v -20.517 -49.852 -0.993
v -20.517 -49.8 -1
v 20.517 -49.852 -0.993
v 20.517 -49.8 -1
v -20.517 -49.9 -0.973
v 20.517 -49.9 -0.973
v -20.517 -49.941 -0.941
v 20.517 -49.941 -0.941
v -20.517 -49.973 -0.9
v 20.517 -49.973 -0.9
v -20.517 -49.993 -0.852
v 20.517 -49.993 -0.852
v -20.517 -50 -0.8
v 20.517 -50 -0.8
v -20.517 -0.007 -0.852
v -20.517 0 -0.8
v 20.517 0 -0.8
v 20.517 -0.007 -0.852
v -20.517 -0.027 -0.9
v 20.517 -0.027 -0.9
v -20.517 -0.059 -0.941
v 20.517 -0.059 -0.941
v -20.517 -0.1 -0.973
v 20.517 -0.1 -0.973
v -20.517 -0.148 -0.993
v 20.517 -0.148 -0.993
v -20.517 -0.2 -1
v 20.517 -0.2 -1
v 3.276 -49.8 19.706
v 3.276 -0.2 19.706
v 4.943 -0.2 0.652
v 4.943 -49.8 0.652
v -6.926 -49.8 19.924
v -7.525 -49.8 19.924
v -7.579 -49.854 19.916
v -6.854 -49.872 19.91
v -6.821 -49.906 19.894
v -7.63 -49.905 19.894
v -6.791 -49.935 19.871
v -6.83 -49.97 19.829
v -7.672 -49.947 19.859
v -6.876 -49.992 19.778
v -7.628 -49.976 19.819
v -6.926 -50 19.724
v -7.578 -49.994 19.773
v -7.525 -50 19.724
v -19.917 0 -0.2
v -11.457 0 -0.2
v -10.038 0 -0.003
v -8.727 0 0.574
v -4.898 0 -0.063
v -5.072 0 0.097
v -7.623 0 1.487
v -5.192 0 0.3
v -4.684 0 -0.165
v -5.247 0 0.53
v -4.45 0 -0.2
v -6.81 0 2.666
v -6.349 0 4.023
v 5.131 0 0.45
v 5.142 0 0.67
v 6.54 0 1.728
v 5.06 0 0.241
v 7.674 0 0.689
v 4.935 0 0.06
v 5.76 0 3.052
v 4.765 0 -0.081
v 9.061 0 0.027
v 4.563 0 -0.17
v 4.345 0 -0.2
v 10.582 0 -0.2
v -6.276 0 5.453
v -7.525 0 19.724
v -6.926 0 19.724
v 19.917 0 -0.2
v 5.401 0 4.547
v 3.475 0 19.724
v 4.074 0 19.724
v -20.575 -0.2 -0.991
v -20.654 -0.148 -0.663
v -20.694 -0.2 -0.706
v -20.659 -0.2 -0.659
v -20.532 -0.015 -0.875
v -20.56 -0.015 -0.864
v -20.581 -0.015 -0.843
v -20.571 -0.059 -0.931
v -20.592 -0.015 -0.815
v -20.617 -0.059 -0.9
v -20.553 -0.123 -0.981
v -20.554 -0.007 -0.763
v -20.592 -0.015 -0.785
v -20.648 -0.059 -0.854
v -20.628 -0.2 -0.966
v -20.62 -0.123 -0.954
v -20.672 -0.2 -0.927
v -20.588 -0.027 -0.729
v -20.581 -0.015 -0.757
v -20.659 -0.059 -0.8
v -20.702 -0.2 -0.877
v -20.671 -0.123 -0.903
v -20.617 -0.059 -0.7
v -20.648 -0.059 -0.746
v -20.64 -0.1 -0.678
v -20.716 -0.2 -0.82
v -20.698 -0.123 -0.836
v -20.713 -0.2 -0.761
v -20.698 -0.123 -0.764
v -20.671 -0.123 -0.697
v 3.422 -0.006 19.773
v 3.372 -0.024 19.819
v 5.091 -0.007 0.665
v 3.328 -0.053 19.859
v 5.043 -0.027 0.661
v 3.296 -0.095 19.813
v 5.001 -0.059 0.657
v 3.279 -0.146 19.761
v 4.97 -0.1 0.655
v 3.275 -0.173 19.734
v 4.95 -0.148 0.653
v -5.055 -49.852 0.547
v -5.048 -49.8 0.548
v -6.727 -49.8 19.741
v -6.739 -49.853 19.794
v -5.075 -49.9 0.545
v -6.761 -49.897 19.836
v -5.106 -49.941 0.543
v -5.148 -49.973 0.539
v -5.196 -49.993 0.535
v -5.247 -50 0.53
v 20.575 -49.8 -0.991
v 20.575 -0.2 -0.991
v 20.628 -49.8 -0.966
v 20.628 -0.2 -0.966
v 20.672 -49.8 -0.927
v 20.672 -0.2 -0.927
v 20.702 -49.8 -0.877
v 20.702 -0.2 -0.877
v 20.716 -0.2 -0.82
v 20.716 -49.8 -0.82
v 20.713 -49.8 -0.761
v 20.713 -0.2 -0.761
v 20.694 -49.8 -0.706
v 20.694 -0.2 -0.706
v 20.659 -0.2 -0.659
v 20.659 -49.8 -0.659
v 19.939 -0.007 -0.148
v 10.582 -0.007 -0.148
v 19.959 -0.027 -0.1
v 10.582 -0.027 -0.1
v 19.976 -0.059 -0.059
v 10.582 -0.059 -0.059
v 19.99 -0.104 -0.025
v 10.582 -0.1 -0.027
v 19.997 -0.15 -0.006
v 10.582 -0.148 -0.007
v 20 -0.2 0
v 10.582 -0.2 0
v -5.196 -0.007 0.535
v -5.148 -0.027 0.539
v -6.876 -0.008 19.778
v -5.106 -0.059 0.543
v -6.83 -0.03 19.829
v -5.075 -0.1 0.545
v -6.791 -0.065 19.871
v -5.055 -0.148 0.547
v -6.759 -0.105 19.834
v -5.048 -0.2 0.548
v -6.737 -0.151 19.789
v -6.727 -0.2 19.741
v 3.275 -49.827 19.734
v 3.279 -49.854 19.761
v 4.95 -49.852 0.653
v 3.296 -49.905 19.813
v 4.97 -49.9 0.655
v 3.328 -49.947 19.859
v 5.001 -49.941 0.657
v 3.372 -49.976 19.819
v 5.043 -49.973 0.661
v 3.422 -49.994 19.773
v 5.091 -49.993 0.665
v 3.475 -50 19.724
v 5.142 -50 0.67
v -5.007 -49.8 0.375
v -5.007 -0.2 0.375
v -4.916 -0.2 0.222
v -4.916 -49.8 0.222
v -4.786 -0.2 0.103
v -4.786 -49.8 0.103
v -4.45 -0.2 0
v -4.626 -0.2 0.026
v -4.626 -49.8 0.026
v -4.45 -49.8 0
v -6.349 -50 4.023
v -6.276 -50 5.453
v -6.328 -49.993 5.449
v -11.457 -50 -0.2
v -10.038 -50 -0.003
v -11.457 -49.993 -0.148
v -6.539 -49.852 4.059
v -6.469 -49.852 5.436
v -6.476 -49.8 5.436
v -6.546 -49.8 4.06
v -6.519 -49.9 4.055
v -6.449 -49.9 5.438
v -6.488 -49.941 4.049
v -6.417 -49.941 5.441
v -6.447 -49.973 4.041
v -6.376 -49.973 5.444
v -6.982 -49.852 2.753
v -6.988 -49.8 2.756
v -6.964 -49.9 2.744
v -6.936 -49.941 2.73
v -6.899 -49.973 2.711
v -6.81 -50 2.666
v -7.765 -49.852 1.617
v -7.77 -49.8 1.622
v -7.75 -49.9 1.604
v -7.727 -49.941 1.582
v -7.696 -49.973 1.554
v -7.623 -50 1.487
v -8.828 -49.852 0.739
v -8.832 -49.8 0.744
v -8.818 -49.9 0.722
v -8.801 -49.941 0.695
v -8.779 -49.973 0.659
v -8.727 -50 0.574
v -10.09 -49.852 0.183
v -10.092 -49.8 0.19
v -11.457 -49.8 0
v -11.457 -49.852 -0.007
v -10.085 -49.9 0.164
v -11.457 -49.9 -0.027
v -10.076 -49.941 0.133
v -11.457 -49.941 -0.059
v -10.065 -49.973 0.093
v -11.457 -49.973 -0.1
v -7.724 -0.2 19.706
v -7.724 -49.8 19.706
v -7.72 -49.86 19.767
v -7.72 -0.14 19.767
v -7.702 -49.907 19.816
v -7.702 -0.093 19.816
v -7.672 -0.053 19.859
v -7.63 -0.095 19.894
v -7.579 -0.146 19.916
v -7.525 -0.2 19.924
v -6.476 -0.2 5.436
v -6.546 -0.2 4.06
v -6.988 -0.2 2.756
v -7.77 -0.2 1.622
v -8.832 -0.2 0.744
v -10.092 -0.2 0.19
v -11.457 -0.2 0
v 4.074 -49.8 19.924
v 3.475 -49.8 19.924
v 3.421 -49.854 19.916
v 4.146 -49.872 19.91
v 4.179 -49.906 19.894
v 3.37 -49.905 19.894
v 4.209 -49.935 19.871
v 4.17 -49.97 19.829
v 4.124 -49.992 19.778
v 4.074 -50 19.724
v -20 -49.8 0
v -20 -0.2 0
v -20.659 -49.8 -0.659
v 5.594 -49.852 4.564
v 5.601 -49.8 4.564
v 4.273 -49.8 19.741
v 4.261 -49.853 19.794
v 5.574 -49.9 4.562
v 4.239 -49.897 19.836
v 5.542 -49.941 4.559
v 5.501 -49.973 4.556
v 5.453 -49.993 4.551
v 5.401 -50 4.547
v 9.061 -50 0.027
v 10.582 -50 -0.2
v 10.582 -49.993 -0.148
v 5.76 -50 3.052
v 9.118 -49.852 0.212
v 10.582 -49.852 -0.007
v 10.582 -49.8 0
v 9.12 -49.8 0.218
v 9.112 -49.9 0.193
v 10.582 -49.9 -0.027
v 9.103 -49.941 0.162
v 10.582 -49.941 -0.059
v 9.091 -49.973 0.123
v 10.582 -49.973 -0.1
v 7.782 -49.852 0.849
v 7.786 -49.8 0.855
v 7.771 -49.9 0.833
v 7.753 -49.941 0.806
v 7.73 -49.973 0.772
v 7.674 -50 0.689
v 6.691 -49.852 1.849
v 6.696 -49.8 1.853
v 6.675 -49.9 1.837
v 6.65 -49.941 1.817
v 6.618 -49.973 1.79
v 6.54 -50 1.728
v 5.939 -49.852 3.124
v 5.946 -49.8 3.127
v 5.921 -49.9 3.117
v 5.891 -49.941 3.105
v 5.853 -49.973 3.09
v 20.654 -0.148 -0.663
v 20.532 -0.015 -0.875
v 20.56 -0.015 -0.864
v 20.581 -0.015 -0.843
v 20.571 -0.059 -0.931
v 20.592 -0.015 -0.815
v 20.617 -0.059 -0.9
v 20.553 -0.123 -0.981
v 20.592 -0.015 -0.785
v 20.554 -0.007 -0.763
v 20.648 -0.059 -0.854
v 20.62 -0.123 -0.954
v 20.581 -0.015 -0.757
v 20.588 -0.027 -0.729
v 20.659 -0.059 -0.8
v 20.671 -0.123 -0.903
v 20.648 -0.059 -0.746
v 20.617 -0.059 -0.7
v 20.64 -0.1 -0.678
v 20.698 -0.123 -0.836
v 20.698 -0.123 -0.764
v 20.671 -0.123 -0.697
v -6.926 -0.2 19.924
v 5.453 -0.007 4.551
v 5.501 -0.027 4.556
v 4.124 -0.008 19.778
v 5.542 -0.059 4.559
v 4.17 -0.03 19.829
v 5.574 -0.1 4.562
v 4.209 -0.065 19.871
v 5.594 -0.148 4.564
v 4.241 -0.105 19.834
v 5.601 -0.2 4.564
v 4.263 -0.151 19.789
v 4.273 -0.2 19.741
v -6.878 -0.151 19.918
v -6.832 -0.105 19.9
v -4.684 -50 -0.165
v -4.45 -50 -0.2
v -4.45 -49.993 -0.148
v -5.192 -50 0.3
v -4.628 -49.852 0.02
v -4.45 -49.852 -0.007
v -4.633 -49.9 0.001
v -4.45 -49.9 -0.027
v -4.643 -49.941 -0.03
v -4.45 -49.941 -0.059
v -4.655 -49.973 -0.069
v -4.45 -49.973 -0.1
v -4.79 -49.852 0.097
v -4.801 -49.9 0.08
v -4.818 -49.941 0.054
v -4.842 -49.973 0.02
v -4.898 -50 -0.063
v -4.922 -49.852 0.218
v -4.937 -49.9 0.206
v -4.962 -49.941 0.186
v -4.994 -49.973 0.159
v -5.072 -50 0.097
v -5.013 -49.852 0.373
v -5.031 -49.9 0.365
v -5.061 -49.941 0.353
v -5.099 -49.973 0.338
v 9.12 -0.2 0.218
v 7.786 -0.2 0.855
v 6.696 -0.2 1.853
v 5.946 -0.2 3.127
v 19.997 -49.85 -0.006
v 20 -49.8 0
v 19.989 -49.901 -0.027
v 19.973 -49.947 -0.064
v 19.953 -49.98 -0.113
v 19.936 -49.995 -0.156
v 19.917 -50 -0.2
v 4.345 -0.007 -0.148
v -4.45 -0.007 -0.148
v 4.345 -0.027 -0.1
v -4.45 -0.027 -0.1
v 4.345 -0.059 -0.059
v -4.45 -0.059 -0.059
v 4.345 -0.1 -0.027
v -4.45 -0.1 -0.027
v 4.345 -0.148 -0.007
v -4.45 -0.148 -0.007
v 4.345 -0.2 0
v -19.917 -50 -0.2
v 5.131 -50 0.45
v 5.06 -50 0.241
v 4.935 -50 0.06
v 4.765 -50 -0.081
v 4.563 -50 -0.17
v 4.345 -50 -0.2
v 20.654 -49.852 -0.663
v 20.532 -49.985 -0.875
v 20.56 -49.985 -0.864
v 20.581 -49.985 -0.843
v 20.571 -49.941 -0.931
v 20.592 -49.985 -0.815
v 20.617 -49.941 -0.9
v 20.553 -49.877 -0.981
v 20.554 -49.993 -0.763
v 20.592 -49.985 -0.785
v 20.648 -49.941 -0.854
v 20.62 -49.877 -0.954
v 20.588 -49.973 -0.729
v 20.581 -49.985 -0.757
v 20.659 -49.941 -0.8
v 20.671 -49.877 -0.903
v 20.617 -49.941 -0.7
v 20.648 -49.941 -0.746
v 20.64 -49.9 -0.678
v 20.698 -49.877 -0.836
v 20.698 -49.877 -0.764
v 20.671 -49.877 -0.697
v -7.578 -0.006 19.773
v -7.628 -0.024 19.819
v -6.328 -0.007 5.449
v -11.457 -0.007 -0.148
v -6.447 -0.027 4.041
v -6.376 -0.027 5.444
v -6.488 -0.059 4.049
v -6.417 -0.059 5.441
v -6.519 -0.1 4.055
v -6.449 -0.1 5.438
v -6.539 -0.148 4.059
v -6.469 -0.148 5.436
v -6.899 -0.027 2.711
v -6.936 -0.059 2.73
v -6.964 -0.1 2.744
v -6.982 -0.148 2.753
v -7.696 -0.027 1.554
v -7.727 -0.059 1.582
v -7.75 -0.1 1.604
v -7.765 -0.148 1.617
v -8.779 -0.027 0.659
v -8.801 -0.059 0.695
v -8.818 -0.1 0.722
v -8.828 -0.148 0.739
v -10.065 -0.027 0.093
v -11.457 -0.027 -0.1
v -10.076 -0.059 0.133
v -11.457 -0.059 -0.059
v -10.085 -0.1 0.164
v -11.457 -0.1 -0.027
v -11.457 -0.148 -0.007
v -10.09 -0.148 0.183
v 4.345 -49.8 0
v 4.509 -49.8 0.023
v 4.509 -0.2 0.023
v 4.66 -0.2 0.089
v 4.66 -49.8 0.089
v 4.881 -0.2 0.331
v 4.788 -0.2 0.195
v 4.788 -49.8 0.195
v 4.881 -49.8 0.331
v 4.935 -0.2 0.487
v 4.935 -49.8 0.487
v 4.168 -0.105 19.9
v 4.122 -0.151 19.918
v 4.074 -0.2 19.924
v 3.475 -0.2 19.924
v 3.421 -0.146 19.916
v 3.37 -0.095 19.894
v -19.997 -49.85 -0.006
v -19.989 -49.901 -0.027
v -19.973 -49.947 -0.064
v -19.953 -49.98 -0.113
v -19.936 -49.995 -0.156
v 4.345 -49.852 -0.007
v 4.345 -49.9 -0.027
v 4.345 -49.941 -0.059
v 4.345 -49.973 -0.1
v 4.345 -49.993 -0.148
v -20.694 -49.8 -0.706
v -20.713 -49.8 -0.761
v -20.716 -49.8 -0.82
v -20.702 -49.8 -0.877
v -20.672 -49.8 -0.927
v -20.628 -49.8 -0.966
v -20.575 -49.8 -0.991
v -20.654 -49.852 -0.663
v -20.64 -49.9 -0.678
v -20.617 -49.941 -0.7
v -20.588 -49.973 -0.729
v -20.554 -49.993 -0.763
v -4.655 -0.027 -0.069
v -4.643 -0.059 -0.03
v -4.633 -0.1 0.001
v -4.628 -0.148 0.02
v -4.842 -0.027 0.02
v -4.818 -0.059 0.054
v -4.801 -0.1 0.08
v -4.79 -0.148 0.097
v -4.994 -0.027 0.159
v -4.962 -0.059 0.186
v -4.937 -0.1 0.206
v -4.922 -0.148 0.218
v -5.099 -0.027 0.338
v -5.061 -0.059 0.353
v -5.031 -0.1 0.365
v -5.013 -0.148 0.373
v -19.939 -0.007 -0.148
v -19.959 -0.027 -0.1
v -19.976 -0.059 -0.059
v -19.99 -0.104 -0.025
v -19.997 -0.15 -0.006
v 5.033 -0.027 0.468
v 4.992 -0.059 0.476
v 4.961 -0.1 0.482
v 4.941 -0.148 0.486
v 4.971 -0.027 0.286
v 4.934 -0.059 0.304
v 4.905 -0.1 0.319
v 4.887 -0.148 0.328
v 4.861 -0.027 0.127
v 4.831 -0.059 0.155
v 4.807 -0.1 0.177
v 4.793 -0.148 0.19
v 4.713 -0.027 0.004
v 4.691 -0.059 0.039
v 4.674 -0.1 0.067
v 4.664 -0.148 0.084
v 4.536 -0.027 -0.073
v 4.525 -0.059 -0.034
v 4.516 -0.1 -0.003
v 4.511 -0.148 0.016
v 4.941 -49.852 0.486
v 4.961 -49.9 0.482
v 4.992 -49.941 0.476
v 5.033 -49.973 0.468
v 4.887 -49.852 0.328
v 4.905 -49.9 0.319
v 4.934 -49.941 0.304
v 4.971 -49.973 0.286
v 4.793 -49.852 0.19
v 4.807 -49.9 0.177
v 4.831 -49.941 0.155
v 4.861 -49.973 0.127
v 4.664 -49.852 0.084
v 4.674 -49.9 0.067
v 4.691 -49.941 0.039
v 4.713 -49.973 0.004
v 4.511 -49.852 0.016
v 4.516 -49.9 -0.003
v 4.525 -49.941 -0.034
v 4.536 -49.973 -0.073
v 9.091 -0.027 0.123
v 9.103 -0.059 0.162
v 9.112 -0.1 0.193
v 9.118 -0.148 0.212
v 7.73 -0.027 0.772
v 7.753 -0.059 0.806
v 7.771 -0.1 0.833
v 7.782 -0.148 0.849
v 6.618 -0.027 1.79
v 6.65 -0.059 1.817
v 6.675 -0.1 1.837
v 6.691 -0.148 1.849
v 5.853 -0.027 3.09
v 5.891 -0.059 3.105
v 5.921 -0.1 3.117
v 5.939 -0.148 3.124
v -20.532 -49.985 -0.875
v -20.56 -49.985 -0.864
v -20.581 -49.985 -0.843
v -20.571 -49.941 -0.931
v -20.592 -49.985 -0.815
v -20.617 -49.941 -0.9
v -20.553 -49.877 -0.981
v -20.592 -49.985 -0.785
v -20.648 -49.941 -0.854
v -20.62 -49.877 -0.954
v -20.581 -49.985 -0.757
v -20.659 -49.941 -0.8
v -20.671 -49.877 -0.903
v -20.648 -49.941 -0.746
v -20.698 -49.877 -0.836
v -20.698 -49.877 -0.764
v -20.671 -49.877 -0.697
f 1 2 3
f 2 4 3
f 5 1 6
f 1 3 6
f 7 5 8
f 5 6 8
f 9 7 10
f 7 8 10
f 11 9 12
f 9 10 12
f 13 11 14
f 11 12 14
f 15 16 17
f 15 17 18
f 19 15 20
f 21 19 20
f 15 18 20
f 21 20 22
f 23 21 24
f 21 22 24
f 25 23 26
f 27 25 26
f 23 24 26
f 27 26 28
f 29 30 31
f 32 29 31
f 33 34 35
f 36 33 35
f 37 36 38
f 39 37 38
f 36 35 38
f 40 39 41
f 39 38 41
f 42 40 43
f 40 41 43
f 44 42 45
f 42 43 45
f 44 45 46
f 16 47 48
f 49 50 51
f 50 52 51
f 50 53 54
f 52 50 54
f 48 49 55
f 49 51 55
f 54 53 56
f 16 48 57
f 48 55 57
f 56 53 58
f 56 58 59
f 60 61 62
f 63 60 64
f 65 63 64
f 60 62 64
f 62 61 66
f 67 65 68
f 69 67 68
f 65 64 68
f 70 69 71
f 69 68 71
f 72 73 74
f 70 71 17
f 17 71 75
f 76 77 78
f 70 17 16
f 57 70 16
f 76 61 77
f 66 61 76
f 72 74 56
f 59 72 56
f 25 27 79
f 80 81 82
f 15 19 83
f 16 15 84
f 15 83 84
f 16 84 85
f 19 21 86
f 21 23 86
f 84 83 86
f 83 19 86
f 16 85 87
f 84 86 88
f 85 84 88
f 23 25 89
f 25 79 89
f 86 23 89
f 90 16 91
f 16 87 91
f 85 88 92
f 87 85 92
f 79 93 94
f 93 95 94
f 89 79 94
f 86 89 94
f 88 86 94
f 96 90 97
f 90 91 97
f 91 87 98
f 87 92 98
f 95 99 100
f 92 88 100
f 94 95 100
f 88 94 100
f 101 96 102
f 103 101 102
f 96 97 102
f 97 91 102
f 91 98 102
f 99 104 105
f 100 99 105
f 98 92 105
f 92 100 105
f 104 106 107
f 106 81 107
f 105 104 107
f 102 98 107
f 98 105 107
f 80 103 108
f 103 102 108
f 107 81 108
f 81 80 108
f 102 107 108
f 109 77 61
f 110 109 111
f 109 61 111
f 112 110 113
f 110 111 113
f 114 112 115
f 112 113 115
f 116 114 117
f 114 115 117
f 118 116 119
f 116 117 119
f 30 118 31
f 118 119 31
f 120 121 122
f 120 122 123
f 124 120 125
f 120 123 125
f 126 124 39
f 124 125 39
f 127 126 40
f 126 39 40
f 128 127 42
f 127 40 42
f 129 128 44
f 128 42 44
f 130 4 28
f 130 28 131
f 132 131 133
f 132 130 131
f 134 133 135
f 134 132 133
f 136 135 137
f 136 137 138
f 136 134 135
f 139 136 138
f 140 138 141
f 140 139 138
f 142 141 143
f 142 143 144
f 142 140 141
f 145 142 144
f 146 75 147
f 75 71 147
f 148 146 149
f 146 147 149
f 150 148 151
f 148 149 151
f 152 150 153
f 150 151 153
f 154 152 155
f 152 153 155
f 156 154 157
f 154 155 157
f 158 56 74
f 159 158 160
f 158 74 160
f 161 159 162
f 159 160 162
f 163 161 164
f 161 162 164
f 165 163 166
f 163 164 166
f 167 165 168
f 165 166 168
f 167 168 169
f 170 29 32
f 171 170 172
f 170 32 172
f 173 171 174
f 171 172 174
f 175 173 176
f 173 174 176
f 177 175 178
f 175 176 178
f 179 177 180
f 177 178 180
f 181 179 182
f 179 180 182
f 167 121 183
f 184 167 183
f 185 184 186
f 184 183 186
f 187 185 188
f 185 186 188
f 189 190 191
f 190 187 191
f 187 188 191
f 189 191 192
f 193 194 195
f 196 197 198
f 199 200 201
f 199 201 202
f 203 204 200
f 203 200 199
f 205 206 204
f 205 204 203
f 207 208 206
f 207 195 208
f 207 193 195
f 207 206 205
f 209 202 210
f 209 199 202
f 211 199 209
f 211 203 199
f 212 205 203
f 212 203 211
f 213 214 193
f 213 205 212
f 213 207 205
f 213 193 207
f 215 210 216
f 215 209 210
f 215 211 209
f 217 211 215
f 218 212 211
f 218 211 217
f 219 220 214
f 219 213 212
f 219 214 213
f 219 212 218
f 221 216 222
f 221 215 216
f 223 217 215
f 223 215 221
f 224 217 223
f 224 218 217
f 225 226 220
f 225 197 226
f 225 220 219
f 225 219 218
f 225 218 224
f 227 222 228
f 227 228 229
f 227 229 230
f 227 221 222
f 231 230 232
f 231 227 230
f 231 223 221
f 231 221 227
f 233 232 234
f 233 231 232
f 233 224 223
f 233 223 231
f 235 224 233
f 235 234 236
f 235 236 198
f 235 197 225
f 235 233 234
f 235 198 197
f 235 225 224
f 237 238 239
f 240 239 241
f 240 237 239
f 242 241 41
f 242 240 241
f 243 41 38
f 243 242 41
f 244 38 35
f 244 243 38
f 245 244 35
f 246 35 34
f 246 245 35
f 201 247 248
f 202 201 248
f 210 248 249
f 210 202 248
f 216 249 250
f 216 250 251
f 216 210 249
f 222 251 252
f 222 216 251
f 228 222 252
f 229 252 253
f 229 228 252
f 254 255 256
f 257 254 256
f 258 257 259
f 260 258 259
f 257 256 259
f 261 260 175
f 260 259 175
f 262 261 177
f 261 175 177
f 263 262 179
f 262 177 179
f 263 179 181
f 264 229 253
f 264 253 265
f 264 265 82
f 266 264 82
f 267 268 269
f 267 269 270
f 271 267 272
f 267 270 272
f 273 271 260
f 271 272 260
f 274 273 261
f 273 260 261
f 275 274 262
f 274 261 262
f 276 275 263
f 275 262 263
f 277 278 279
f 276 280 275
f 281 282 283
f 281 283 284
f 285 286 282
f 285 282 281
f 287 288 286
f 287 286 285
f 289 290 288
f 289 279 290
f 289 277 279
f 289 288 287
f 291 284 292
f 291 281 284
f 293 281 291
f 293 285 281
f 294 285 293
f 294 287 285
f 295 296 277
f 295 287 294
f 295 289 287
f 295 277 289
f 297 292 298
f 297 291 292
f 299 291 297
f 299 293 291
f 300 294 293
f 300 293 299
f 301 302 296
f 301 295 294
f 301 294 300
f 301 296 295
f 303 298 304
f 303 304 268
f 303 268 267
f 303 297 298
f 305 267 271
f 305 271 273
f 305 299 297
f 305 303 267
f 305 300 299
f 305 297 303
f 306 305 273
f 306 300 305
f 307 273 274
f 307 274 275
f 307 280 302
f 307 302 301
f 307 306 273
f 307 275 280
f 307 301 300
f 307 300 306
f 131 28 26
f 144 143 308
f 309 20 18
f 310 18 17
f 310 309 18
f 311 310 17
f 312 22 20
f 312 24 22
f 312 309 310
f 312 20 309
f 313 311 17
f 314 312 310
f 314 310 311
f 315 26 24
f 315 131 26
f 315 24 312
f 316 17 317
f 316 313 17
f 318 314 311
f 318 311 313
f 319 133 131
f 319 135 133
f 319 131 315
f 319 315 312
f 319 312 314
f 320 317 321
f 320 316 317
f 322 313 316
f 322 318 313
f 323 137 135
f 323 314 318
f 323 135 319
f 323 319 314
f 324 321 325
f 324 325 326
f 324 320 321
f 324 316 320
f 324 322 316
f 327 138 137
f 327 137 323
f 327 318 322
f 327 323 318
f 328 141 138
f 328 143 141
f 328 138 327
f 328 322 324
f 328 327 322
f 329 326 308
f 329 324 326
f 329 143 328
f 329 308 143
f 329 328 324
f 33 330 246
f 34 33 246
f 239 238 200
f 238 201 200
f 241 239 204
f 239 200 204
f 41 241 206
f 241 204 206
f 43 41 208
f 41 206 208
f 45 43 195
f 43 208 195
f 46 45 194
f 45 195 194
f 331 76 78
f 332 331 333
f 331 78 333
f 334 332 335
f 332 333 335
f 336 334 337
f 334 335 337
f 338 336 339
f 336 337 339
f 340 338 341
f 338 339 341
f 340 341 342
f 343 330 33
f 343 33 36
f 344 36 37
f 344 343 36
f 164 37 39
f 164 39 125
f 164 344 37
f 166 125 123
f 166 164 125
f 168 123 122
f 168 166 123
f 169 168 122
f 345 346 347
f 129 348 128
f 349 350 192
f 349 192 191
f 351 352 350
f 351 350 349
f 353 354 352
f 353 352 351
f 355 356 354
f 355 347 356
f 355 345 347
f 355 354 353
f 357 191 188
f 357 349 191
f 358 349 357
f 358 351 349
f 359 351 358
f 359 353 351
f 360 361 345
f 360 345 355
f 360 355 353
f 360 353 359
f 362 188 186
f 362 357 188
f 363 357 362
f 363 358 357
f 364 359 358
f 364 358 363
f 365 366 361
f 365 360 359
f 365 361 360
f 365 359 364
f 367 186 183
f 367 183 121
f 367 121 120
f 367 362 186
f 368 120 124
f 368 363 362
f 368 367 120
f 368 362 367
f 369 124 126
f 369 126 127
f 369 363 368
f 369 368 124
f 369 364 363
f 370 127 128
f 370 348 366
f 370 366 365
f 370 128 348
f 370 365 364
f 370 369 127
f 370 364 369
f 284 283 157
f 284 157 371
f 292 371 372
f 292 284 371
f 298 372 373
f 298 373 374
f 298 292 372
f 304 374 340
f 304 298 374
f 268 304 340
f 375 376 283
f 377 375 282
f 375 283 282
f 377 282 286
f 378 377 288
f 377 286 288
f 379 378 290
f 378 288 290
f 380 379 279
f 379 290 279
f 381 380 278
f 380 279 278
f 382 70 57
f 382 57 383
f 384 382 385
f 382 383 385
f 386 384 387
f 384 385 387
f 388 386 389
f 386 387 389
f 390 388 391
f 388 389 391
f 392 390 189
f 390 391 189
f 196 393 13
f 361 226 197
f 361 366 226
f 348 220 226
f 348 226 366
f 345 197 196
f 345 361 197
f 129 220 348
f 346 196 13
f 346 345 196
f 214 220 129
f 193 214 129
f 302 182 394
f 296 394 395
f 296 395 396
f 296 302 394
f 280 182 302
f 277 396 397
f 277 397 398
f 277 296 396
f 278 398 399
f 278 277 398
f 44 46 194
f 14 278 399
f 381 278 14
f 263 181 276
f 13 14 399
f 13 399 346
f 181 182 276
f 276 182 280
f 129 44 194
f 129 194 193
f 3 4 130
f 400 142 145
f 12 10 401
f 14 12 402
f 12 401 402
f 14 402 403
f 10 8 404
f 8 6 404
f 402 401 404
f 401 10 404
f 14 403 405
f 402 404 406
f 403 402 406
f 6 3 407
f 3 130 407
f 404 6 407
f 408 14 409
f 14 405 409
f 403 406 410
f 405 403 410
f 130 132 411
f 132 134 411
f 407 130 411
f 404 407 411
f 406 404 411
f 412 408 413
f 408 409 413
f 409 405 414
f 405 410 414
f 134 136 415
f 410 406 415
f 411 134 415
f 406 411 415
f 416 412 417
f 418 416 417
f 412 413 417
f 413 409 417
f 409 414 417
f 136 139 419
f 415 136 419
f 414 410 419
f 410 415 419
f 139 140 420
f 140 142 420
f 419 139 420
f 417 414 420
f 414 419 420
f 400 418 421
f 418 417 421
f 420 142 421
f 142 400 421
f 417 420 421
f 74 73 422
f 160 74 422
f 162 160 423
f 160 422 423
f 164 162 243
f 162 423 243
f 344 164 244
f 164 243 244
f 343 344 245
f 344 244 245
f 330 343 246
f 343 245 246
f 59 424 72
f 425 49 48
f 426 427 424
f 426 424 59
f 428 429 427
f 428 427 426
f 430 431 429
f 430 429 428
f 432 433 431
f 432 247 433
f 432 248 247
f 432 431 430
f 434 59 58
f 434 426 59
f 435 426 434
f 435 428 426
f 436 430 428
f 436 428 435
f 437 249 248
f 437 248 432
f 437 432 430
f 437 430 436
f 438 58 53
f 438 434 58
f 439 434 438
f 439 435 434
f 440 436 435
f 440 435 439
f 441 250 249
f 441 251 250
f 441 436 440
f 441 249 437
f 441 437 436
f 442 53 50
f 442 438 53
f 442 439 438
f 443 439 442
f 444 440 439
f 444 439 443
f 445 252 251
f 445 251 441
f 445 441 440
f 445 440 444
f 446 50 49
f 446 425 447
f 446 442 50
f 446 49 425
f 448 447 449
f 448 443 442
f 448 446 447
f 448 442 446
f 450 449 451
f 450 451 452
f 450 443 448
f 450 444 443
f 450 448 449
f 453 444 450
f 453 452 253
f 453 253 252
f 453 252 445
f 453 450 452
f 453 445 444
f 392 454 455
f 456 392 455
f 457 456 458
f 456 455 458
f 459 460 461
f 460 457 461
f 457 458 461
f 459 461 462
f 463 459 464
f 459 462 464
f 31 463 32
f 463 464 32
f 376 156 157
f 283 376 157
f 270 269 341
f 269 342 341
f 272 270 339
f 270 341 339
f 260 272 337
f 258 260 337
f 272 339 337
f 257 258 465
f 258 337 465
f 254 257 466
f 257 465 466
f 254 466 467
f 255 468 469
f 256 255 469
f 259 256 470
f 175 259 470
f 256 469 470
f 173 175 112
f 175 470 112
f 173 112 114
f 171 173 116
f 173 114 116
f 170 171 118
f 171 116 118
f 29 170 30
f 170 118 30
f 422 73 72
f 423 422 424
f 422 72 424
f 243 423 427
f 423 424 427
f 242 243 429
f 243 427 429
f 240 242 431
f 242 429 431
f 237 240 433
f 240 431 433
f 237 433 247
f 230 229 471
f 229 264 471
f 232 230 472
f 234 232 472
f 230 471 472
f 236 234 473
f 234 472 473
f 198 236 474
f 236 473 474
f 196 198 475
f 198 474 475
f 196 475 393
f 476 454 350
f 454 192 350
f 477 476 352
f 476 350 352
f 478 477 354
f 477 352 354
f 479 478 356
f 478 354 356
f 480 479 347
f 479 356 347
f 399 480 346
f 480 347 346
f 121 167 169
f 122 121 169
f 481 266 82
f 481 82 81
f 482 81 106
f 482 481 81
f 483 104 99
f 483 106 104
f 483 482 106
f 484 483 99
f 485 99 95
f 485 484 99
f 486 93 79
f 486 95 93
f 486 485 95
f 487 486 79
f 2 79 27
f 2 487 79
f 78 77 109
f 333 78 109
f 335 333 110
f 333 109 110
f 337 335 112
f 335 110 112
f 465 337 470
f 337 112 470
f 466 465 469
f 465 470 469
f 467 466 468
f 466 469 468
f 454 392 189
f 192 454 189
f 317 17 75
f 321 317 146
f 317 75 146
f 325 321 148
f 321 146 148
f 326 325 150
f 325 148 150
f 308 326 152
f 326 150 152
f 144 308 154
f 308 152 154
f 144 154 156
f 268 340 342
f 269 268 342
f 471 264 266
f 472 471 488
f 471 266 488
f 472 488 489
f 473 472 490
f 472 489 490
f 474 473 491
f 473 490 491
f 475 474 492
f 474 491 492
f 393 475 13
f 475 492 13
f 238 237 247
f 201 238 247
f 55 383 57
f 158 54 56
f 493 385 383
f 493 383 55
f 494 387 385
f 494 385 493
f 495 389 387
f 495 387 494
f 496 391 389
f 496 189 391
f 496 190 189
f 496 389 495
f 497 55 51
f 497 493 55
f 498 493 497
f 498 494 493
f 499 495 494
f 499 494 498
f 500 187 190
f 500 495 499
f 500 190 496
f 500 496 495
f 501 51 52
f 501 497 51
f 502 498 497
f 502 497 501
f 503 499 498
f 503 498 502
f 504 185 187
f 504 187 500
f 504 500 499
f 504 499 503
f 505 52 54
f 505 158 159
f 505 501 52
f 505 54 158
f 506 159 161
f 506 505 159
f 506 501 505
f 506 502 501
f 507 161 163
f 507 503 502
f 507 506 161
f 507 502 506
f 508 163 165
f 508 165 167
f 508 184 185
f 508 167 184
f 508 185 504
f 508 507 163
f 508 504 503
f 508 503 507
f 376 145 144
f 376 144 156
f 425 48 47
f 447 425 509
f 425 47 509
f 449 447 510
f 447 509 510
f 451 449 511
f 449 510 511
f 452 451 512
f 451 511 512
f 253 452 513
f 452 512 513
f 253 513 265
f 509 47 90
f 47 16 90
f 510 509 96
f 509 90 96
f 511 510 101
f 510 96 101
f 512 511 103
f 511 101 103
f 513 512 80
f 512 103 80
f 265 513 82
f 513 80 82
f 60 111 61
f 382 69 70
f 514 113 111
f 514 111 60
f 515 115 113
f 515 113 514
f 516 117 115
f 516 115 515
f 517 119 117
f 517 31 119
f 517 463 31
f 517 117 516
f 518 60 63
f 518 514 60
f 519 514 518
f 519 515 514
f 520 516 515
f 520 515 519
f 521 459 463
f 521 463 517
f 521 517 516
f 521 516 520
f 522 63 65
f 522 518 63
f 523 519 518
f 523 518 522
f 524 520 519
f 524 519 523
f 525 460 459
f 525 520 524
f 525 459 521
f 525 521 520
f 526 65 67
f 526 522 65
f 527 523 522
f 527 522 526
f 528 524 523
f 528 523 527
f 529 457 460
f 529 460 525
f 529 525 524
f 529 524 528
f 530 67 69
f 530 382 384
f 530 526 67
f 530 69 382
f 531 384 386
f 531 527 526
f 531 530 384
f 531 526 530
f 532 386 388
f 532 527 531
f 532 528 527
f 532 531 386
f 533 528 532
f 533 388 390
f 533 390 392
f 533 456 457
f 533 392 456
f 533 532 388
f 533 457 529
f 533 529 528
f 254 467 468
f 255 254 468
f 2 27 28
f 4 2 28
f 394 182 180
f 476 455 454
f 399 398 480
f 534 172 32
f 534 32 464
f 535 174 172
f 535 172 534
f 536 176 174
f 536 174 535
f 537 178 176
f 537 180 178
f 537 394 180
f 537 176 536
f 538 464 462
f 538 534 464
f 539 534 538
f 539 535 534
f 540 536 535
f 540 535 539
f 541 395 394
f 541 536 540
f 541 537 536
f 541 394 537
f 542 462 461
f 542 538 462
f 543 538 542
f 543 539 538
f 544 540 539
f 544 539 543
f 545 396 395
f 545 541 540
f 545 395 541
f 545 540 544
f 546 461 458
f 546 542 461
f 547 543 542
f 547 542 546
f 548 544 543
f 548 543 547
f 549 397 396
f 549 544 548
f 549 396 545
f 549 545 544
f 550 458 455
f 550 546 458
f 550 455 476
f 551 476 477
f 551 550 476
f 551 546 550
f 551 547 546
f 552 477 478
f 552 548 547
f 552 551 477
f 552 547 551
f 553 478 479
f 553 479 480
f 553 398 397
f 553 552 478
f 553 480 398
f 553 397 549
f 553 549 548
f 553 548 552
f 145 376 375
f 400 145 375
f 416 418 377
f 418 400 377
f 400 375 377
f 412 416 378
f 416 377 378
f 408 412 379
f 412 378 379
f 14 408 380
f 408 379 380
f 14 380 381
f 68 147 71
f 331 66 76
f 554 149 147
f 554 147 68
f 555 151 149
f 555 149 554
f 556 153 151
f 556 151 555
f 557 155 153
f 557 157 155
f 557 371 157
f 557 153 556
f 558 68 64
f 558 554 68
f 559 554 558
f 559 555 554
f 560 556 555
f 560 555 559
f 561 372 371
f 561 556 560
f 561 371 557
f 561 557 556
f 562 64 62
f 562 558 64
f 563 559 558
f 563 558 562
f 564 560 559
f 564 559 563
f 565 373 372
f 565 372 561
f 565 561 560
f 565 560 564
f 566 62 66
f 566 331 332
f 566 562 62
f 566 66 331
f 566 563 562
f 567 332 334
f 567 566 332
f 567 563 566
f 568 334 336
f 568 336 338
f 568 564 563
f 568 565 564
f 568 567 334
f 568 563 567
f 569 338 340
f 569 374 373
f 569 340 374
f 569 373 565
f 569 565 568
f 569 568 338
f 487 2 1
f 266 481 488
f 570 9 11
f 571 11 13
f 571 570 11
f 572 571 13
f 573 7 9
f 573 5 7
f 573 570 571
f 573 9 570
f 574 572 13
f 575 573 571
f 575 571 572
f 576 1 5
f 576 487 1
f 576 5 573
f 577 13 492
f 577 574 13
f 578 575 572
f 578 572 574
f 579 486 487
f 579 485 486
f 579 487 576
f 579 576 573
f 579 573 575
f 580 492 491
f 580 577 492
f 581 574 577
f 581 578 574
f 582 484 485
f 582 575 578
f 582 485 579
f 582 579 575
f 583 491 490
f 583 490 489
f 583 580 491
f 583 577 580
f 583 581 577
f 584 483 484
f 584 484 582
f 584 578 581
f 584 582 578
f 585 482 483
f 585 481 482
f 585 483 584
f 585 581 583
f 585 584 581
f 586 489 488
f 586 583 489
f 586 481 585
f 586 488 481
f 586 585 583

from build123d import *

# Parameters (mm, degrees)
F1_DEPTH    = 50
F2_R        = 5
F3_R        = 0.6
F4_R        = 0.2
F5_T1_DEPTH = 50.516331174
F5_T3_DEPTH = 50.6913085011


# Not quite as in the source:
# - a fillet or chamfer that OpenCascade refuses, or shapes differently, is made with other operations: its cross-section is extruded or revolved along the edge and cut away or added


with BuildPart() as f1:
    # F0 (on Front) → F1 (new body)
    with BuildSketch(Plane.XZ):
        Polygon((5, 0), (-5, 0), (-6.743114855, 19.9238939618), (-7.743114855, 19.9238939618), (-6, 0), (-20, 0), (-21, -1), (21, -1), (20, 0), (6, 0), (4.256885145, 19.9238939618), (3.256885145, 19.9238939618), align=None)
    extrude(amount=F1_DEPTH)

    # F2
    f2_edges = [f1.edges().sort_by_distance(p)[0] for p in [
        (-6, -25, 0),
        (6, -25, 0),
    ]]
    fillet(f2_edges, radius=F2_R)

    # F3
    f3_edges = [f1.edges().sort_by_distance(p)[0] for p in [
        (-5, -25, 0),
        (5, -25, 0),
    ]]
    fillet(f3_edges, radius=F3_R)

    # F4
    f4_edges = [f1.edges().sort_by_distance(p)[0] for p in [
        (-21, -25, -1),
        (21, -25, -1),
        (0, 0, -1),
        (0, -50, -1),
        (-5.895516, -50, 10.2358),
        (-4.855555, -50, 0.157634),
        (-7.243115, -50, 19.923894),
        (-0.052493, -50, 0),
        (-7.109342, -50, 12.679836),
        (4.787581, -50, 0.194646),
        (-7.770156, -50, 1.622049),
        (4.099908, -50, 10.288094),
        (-15.728271, -50, 0),
        (3.756885, -50, 19.923894),
        (-20.5, -50, -0.5),
        (4.928784, -50, 12.244058),
        (7.203705, -50, 1.313613),
        (20.5, -50, -0.5),
        (15.290828, -50, 0),
        (-5.895516, 0, 10.2358),
        (-4.855555, 0, 0.157634),
        (-7.243115, 0, 19.923894),
        (-0.052493, 0, 0),
        (-7.109342, 0, 12.679836),
        (4.787581, 0, 0.194646),
        (-7.770156, 0, 1.622049),
        (4.099908, 0, 10.288094),
        (-15.728271, 0, 0),
        (3.756885, 0, 19.923894),
        (-20.5, 0, -0.5),
        (4.928784, 0, 12.244058),
        (7.203705, 0, 1.313613),
        (20.5, 0, -0.5),
        (15.290828, 0, 0),
    ]]
    fillet(f4_edges, radius=F4_R)

    # F5: fillet of radius 0.2 on 8 edges, made by hand

    # F5_s2 → F5_t1 (cut)
    with BuildSketch(Plane.XZ.offset(-0.258165587)):
        with BuildLine():
            ThreePointArc((-6.9263810898, 19.9238939618), (-6.7912630482, 19.8713494292), (-6.7271421501, 19.7413251104))
            Line((-6.7271421501, 19.7413251104), (-6.743114855, 19.9238939618))
            Line((-6.743114855, 19.9238939618), (-6.9263810898, 19.9238939618))
        make_face()
        with BuildLine():
            ThreePointArc((4.2728578499, 19.7413251104), (4.2087369518, 19.8713494292), (4.0736189102, 19.9238939618))
            Line((4.0736189102, 19.9238939618), (4.256885145, 19.9238939618))
            Line((4.256885145, 19.9238939618), (4.2728578499, 19.7413251104))
        make_face()
    extrude(amount=F5_T1_DEPTH, mode=Mode.SUBTRACT)

    # F5_s4 → F5_t3 (cut)
    with BuildSketch(Plane.XZ.offset(-0.3456542505)):
        with BuildLine():
            ThreePointArc((-7.7240920944, 19.7064628133), (-7.6723086221, 19.8590120034), (-7.5248531547, 19.9238939618))
            Line((-7.5248531547, 19.9238939618), (-7.743114855, 19.9238939618))
            Line((-7.743114855, 19.9238939618), (-7.7240920944, 19.7064628133))
        make_face()
        with BuildLine():
            ThreePointArc((3.4751468453, 19.9238939618), (3.3276913779, 19.8590120034), (3.2759079056, 19.7064628133))
            Line((3.2759079056, 19.7064628133), (3.256885145, 19.9238939618))
            Line((3.256885145, 19.9238939618), (3.4751468453, 19.9238939618))
        make_face()
    extrude(amount=F5_T3_DEPTH, mode=Mode.SUBTRACT)


solid = f1.part
